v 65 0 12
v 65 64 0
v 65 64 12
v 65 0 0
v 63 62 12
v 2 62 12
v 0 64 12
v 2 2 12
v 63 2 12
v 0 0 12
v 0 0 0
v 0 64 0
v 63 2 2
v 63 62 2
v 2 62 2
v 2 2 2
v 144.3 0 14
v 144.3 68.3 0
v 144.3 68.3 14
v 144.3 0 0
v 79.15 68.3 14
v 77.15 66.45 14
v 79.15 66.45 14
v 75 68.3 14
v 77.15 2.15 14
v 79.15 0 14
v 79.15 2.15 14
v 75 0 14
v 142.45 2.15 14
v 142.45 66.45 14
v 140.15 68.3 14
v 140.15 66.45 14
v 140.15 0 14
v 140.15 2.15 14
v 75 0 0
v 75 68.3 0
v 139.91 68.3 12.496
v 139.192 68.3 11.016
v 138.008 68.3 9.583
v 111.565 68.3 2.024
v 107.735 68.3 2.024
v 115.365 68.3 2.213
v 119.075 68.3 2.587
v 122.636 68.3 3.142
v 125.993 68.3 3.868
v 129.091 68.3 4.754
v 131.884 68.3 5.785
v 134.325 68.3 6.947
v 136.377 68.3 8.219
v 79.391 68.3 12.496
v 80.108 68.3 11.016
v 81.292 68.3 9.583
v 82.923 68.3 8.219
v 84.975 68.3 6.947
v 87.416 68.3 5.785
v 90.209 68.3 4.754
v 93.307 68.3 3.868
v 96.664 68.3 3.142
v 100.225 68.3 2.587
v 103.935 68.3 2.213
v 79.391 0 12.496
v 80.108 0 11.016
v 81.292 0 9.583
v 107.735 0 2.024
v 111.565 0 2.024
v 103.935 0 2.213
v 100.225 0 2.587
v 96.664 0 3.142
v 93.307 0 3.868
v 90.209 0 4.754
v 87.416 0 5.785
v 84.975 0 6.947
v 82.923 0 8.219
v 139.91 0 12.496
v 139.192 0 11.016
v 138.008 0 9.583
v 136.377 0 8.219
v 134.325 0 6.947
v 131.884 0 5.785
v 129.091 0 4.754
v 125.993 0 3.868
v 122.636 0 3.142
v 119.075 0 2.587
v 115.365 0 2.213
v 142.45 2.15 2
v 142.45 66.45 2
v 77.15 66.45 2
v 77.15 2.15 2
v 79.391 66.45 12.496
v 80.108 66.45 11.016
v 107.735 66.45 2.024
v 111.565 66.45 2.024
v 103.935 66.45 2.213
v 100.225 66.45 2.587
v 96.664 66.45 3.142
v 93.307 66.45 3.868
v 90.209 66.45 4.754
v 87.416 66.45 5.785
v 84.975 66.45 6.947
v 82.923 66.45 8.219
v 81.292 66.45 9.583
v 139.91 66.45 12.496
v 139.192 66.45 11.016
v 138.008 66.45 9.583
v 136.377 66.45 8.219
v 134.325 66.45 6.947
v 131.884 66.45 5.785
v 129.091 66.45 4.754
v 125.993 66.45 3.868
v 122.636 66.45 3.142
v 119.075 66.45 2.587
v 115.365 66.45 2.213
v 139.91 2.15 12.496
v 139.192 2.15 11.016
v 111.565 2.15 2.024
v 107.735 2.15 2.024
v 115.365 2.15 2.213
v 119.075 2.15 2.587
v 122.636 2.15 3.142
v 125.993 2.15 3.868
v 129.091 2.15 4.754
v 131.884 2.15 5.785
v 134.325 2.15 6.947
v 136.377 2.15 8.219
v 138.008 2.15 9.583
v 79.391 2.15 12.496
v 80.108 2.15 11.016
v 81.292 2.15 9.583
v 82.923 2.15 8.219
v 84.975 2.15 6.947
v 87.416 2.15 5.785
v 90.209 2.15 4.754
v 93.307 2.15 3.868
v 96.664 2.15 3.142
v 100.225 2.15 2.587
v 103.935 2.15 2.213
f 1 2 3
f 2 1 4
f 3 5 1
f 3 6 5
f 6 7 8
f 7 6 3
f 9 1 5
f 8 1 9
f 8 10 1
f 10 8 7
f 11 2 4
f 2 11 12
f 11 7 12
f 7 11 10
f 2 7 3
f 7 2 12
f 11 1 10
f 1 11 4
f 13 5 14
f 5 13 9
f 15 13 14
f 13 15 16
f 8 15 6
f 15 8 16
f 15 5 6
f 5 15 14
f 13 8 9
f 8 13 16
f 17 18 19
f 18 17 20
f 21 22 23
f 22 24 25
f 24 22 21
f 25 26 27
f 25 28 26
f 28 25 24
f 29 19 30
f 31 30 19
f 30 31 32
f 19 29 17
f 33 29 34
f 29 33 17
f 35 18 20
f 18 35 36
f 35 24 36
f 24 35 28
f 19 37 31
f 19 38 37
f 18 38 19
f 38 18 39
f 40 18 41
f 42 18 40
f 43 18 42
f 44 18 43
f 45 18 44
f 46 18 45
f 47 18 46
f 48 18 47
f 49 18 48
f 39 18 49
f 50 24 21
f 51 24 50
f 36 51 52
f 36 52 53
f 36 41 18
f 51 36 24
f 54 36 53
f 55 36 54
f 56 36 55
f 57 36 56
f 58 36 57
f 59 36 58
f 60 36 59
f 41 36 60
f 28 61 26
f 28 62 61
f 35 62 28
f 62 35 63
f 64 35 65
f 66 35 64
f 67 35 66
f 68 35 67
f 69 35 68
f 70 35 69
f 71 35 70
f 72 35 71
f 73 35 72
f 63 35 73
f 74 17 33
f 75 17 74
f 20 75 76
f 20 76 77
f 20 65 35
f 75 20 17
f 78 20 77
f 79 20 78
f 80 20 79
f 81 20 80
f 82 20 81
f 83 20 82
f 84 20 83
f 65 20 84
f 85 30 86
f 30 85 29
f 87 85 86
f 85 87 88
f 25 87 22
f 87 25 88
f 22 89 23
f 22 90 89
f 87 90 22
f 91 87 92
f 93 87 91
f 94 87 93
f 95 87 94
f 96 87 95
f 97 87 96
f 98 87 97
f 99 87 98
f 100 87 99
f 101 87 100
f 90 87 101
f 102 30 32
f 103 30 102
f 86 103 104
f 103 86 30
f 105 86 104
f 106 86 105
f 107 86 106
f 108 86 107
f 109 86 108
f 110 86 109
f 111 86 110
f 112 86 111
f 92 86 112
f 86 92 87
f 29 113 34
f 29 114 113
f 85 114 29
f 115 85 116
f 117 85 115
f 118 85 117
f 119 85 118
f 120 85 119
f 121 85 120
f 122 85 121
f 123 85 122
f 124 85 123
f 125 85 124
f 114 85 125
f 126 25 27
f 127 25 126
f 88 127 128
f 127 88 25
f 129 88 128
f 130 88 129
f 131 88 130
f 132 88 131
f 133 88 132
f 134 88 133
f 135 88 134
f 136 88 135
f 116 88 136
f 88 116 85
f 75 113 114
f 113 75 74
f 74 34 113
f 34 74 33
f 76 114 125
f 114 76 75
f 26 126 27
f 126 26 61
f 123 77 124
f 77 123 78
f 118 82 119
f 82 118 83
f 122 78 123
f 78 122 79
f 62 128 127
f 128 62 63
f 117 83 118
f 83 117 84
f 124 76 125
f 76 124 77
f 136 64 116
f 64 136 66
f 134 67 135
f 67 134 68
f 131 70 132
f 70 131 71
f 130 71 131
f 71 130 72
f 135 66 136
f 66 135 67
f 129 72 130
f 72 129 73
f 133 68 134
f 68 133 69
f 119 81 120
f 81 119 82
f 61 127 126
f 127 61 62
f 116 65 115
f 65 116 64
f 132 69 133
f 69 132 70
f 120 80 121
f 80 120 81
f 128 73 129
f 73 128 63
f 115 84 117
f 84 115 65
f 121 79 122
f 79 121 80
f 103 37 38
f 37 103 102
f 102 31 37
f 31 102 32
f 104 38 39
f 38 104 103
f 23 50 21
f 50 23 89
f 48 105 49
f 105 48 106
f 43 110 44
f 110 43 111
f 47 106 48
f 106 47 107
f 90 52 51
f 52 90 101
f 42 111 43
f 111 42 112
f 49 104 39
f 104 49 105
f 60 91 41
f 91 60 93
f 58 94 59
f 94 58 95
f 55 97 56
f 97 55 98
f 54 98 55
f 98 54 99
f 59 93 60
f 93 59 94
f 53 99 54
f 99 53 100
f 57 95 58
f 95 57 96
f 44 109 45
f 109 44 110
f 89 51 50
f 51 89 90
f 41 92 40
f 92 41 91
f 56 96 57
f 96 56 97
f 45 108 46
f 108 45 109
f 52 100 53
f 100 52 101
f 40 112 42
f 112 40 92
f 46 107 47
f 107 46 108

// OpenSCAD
$fn=50;
condomLength=61;
condomWidth=60;
condomHeight=5; 
numberOfCondoms=2;
tolerance=0.15;
wall=2;
lowerBox();
translate([condomLength + wall *2 +10,0,0])
upperBox();
module upperBox()
{
    difference()
    {
    //upper box box
        cube([condomLength + wall * 4 + tolerance * 2,condomWidth + wall * 4 + tolerance * 2, wall * 2 + condomHeight * numberOfCondoms]);
        //lower box
        translate([wall+tolerance, wall+tolerance,wall])
            cube([condomLength + wall * 2 + tolerance * 2,condomWidth + wall * 2 + tolerance * 2, wall + condomHeight * numberOfCondoms +0.01]);
        
        translate([condomLength/2 + wall *2+tolerance,-0.01,((wall + condomHeight * numberOfCondoms)/2)*2+wall])
        scale([condomLength/(wall + condomHeight * numberOfCondoms),1,2])
        rotate([-90,0,0])
        cylinder(wall+0.22,(wall + condomHeight * numberOfCondoms)/2,(wall + condomHeight * numberOfCondoms)/2);
        
        translate([condomLength/2 + wall *2+tolerance,wall*3 + tolerance*2+condomWidth,((wall + condomHeight * numberOfCondoms)/2)*2+wall])
        scale([condomLength/(wall + condomHeight * numberOfCondoms),1,2])
        rotate([-90,0,0])
        cylinder(wall+0.02,(wall + condomHeight * numberOfCondoms)/2,(wall + condomHeight * numberOfCondoms)/2);
    }
}
module lowerBox()
{
    difference()
    {
        //lower box
        cube([condomLength + wall * 2,condomWidth + wall * 2, wall + condomHeight * numberOfCondoms]);

        //condom
        translate([wall,wall,wall])
        cube([condomLength,condomWidth, condomHeight * numberOfCondoms+0.01]);
    }
}
